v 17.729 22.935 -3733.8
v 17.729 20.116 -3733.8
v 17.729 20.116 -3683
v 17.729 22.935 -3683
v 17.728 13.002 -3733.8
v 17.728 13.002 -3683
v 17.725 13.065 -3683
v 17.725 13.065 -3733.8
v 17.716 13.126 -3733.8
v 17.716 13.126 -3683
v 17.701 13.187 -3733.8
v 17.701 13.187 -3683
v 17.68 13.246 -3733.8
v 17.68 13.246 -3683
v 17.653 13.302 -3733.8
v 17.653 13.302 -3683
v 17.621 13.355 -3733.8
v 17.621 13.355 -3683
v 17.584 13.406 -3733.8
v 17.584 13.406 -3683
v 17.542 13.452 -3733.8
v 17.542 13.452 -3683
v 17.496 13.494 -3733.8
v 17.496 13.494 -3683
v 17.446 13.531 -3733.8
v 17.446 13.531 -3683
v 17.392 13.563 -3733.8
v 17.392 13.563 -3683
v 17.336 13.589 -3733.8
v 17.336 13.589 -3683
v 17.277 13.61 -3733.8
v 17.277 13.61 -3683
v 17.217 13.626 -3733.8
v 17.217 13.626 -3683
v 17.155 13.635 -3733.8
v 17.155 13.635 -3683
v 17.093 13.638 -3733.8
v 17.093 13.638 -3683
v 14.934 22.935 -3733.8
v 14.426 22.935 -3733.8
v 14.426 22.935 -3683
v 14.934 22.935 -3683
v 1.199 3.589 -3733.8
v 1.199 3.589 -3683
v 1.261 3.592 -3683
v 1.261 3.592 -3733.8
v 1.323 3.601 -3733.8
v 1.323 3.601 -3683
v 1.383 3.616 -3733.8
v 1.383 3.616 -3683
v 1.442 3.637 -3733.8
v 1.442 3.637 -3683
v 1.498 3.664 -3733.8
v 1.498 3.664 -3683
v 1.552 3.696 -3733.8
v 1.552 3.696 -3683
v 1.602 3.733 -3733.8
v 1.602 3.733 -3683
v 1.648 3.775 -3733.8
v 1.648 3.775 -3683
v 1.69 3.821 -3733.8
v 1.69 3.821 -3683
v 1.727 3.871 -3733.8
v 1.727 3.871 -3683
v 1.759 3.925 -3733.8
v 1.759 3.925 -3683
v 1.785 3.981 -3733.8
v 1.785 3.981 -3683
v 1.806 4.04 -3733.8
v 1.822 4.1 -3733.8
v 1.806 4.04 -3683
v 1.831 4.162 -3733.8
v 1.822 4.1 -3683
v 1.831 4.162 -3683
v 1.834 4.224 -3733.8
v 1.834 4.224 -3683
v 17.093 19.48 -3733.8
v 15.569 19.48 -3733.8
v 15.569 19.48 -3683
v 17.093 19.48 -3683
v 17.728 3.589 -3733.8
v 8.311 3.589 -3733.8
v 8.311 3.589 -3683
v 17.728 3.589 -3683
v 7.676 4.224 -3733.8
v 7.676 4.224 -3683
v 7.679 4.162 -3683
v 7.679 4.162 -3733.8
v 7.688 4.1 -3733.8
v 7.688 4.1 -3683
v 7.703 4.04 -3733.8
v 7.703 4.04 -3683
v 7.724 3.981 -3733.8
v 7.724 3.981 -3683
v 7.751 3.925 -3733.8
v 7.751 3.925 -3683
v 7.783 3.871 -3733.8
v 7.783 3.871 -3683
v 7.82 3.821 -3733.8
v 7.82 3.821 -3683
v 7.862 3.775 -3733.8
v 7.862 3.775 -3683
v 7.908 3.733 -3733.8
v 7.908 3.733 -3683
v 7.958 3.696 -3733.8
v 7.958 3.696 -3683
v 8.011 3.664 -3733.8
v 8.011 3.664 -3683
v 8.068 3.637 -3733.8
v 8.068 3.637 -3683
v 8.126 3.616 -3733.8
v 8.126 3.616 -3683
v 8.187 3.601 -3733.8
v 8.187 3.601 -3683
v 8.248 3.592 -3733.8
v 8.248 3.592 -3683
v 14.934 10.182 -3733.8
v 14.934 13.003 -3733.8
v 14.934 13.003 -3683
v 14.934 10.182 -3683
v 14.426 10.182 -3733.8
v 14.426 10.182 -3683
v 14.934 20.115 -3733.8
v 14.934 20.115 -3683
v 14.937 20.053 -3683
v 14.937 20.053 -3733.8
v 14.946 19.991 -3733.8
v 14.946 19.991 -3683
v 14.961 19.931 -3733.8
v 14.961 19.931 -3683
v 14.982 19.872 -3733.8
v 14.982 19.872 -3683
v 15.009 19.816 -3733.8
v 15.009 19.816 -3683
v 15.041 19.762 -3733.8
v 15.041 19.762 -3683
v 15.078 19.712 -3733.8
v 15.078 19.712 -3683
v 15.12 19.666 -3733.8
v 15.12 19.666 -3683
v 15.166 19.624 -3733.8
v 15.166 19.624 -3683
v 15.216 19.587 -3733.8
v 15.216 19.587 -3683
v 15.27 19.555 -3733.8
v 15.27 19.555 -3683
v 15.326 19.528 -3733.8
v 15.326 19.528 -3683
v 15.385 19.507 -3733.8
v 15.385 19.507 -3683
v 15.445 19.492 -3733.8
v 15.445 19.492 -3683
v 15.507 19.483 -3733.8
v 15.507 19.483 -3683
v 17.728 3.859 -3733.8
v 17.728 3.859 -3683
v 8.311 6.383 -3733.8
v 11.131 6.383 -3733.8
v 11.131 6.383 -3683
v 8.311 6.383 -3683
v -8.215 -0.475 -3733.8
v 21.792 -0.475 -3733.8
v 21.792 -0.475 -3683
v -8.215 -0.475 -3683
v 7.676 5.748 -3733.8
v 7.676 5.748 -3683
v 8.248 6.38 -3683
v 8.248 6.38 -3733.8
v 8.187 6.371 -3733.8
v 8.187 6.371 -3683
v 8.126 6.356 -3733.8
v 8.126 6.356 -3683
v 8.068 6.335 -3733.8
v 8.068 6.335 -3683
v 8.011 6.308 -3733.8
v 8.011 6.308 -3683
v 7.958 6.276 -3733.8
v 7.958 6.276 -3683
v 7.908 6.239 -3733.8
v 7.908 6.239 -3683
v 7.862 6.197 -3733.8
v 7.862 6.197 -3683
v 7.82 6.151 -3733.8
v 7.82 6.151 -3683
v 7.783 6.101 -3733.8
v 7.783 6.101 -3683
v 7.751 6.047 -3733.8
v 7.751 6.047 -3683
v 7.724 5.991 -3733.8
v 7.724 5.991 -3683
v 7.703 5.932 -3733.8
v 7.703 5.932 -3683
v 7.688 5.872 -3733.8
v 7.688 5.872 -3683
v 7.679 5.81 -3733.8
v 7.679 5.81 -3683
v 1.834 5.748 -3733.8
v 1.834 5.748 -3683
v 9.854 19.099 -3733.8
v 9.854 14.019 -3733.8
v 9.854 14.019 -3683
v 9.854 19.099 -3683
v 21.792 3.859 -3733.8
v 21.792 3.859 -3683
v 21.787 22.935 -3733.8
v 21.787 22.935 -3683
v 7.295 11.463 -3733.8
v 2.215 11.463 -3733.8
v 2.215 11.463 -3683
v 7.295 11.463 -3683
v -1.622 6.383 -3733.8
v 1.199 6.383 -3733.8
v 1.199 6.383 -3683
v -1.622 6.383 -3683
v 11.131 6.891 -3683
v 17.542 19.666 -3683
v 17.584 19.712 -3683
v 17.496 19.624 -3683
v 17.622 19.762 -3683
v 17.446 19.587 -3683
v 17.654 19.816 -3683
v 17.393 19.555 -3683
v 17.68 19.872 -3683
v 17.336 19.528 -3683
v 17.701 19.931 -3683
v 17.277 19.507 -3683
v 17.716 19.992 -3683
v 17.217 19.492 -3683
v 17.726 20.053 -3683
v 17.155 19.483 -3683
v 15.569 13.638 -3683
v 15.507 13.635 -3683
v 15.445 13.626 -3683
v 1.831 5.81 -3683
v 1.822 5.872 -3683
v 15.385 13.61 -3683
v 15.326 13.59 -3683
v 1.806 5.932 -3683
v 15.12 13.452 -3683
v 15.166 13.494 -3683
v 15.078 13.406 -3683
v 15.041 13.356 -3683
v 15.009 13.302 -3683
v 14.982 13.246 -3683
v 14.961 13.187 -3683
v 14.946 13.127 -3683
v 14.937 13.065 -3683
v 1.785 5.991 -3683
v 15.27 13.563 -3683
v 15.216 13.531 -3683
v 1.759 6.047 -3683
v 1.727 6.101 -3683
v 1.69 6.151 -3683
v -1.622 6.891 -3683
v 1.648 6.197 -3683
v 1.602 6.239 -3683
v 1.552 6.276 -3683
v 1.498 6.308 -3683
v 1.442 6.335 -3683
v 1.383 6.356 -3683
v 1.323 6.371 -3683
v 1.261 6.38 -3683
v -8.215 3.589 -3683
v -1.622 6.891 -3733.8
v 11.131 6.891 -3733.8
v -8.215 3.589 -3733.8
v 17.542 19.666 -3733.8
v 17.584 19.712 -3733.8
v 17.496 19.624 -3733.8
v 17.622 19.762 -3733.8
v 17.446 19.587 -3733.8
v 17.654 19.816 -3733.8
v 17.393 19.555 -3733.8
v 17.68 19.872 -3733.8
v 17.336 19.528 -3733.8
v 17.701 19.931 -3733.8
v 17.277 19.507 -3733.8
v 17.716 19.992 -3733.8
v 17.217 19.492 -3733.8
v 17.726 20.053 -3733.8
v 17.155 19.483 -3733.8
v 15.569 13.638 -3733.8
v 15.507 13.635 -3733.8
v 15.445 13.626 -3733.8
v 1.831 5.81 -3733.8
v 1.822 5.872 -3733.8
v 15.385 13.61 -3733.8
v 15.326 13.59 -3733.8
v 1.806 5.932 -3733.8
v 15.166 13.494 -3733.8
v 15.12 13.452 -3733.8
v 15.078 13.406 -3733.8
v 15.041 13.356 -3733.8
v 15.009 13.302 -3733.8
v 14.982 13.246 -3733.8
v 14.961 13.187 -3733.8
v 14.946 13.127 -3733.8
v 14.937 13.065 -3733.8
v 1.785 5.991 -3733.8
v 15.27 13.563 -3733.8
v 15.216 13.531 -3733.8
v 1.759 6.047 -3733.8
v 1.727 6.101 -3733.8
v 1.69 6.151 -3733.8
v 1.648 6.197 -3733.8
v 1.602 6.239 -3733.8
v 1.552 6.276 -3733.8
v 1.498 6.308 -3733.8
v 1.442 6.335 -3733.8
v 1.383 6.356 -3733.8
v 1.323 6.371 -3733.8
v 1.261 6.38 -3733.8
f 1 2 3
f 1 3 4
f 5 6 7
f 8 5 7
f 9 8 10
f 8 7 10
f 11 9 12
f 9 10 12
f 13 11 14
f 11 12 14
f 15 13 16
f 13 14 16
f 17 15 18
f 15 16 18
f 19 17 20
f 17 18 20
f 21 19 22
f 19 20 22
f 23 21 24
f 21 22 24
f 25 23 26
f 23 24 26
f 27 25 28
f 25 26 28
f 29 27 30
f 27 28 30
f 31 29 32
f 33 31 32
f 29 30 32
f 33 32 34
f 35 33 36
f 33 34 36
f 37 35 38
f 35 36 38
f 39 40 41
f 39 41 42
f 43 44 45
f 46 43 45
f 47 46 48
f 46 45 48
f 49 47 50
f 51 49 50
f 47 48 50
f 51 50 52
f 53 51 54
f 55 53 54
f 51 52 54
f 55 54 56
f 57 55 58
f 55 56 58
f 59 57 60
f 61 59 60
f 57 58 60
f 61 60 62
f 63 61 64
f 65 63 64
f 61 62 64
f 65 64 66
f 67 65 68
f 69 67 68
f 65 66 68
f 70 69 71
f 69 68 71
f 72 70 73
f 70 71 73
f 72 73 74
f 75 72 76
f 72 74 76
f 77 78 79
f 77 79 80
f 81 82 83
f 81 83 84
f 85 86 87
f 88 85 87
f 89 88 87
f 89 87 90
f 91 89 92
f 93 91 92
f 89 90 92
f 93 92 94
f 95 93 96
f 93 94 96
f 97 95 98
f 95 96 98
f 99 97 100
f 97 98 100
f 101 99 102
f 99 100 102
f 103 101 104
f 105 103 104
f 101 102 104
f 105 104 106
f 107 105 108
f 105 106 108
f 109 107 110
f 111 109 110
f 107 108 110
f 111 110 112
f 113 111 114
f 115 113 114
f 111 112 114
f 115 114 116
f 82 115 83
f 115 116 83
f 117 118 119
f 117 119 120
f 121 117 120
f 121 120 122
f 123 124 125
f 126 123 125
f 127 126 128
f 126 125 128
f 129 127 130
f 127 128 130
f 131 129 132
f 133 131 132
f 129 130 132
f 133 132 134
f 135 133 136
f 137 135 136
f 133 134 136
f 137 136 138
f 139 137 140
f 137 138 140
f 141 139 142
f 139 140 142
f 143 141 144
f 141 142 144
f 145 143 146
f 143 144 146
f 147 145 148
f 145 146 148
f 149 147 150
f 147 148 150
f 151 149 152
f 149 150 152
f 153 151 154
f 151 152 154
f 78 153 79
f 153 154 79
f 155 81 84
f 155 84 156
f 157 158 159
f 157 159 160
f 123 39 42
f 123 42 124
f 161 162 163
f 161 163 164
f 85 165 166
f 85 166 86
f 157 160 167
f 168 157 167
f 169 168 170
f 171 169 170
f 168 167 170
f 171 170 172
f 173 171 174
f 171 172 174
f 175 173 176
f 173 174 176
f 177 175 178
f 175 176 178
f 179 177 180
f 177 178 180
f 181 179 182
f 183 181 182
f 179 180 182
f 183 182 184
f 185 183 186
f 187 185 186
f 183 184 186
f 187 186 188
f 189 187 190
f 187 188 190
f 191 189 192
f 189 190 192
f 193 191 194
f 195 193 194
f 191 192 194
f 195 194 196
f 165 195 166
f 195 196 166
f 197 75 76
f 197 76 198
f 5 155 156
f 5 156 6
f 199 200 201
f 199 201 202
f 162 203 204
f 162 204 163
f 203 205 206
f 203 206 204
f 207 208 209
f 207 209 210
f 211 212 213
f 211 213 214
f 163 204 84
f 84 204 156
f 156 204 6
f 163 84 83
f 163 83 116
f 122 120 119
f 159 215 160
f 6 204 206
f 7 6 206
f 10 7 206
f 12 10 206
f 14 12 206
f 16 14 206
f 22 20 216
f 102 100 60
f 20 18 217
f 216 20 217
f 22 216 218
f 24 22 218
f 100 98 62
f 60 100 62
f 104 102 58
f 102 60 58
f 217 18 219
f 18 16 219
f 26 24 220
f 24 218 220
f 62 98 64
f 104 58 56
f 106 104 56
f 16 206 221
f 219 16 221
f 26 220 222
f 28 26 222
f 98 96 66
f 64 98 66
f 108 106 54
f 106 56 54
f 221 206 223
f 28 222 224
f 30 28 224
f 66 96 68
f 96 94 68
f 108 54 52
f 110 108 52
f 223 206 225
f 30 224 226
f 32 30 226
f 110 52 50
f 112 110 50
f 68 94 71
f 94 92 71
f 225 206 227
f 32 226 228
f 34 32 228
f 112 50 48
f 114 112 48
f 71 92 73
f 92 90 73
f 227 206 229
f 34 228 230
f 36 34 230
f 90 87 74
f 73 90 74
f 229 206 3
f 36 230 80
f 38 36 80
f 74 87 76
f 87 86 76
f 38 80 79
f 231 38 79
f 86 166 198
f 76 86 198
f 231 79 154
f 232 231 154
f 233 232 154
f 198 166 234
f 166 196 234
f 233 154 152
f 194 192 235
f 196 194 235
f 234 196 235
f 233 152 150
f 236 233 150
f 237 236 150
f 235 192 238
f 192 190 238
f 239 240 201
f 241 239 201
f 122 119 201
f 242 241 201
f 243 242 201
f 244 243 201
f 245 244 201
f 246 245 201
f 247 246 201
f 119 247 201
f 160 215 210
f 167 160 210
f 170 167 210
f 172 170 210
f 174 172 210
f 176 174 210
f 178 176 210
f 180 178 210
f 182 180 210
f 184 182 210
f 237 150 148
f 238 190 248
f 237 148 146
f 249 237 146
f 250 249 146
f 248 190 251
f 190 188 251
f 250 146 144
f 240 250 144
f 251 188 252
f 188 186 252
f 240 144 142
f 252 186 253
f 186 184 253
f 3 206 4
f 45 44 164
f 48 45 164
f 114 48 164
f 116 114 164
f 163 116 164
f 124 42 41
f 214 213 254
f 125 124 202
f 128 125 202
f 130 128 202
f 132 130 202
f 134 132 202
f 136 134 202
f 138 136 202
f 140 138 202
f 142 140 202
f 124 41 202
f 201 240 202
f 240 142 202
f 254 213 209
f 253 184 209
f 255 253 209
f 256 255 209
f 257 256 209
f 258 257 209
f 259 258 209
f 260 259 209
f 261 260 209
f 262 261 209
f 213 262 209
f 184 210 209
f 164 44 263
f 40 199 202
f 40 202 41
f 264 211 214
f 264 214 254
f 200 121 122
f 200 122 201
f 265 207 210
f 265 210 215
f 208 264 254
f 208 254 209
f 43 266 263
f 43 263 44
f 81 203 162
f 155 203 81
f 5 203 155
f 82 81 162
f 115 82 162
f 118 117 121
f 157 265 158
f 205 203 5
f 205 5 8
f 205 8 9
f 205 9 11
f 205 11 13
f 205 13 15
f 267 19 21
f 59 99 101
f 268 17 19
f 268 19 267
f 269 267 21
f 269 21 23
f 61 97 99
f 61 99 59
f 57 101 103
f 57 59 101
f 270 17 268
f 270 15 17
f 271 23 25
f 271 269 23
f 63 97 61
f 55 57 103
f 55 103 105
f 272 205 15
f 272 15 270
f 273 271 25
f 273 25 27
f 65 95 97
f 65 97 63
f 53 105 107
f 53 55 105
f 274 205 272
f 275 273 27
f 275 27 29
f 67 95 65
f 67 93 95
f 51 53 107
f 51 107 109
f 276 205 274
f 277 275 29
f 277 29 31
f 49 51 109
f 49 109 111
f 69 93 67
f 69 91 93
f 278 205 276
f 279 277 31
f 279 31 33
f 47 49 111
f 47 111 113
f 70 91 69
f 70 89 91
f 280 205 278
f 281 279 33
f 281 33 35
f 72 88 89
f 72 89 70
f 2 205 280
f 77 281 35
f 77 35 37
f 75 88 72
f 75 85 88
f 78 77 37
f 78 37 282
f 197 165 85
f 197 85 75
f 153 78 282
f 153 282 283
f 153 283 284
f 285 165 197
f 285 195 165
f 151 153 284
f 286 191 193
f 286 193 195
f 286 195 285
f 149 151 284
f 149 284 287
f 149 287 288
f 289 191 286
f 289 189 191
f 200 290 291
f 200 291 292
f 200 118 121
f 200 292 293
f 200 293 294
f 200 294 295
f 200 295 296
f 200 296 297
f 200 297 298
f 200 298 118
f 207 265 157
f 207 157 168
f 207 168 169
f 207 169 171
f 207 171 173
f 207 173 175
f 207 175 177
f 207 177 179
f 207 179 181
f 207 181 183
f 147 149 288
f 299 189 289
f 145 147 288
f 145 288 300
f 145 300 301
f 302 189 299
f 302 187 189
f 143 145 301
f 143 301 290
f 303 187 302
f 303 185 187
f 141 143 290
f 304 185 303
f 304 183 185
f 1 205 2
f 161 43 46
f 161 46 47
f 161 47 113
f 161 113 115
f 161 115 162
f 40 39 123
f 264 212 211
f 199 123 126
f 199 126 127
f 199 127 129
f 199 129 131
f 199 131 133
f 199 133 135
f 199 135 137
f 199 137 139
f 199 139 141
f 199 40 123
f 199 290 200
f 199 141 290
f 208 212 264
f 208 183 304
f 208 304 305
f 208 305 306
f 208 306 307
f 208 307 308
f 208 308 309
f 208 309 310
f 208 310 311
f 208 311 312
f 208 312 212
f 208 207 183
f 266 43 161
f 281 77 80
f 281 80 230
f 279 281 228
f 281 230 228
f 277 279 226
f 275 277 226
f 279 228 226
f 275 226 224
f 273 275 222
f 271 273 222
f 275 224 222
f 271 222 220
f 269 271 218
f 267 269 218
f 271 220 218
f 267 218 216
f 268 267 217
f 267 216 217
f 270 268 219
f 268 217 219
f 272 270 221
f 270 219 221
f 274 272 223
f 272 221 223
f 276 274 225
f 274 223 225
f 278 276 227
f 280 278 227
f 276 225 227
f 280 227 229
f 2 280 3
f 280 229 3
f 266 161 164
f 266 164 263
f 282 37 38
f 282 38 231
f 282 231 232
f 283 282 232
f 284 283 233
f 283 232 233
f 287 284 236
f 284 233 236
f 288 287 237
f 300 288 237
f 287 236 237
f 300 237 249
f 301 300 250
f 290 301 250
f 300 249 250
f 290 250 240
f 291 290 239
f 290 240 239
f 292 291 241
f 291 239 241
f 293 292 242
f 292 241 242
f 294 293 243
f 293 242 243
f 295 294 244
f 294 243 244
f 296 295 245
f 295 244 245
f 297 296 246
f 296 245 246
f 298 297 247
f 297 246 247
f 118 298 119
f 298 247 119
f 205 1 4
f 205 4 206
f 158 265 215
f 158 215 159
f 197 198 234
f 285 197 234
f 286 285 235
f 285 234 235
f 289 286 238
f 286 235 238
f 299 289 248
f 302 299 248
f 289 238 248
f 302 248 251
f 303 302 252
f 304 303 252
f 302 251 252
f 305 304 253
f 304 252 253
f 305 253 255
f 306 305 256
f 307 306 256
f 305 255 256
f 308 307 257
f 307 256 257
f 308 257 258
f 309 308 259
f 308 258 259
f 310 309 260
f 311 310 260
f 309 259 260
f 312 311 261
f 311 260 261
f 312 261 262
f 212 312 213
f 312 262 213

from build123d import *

# Parameters (mm, degrees)
BOSS_EXTRUDE1_DEPTH = 50.8


with BuildPart() as part:
    # Sketch1 → Boss-Extrude1 (new body)
    with BuildSketch(Plane(origin=(0, 0, -3683), x_dir=(-1, 0, 0), z_dir=(0, 0, -1))):
        with BuildLine():
            Line((7.945265893, 3.588862728), (-1.198734107, 3.588862728))
            ThreePointArc((-1.198734107, 3.588862728), (-1.647746913, 3.774849922), (-1.833734107, 4.223862728))
            Line((-1.833734107, 4.223862728), (-1.833734107, 5.747862728))
            ThreePointArc((-1.833734107, 5.747862728), (-1.647746913, 6.196875535), (-1.198734107, 6.382862728))
            Line((-1.198734107, 6.382862728), (1.621629442, 6.382862728))
            Line((1.621629442, 6.382862728), (1.621629442, 6.890862686))
            Line((1.621629442, 6.890862686), (-2.214734107, 11.462862728))
            Line((-2.214734107, 11.462862728), (-7.294734107, 11.462862728))
            Line((-7.294734107, 11.462862728), (-11.131097656, 6.890862686))
            Line((-11.131097656, 6.890862686), (-11.131097656, 6.382862728))
            Line((-11.131097656, 6.382862728), (-8.310734107, 6.382862728))
            ThreePointArc((-8.310734107, 6.382862728), (-7.861721301, 6.196875535), (-7.675734107, 5.747862728))
            Line((-7.675734107, 5.747862728), (-7.675734107, 4.223862728))
            ThreePointArc((-7.675734107, 4.223862728), (-7.861721301, 3.774849922), (-8.310734107, 3.588862728))
            Line((-8.310734107, 3.588862728), (-17.454734107, 3.588862728))
            Line((-17.454734107, 3.588862728), (-17.727921752, 3.588862728))
            Line((-17.727921752, 3.588862728), (-17.727921752, 3.858842754))
            Line((-17.727921752, 3.858842754), (-17.728361466, 13.002372481))
            ThreePointArc((-17.728361466, 13.002372481), (-17.542256287, 13.451715967), (-17.092921752, 13.637842754))
            Line((-17.092921752, 13.637842754), (-15.568921752, 13.637842754))
            ThreePointArc((-15.568921752, 13.637842754), (-15.119908946, 13.45185556), (-14.933921752, 13.002842754))
            Line((-14.933921752, 13.002842754), (-14.933921752, 10.182479205))
            Line((-14.933921752, 10.182479205), (-14.425921794, 10.182479205))
            Line((-14.425921794, 10.182479205), (-9.853921752, 14.018842754))
            Line((-9.853921752, 14.018842754), (-9.853921752, 19.098842754))
            Line((-9.853921752, 19.098842754), (-14.425921794, 22.935206303))
            Line((-14.425921794, 22.935206303), (-14.933921752, 22.935206303))
            Line((-14.933921752, 22.935206303), (-14.933921752, 20.114842754))
            ThreePointArc((-14.933921752, 20.114842754), (-15.119908946, 19.665829948), (-15.568921752, 19.479842754))
            Line((-15.568921752, 19.479842754), (-17.092921752, 19.479842754))
            ThreePointArc((-17.092921752, 19.479842754), (-17.542476558, 19.66604812), (-17.728703542, 20.11559397))
            Line((-17.728703542, 20.11559397), (-17.728839138, 22.935206303))
            Line((-17.728839138, 22.935206303), (-21.787214199, 22.935206303))
            Line((-21.787214199, 22.935206303), (-21.791921752, 3.859128788))
            Line((-21.791921752, 3.859128788), (-21.791921752, 3.588862728))
            Line((-21.791921752, 3.588862728), (-21.791921752, -0.475137272))
            Line((-21.791921752, -0.475137272), (-17.727921752, -0.475137272))
            Line((-17.727921752, -0.475137272), (-17.454774021, -0.475137272))
            Line((-17.454774021, -0.475137272), (7.945225979, -0.475137272))
            Line((7.945225979, -0.475137272), (8.215492039, -0.475137272))
            Line((8.215492039, -0.475137272), (8.215492039, 3.588862728))
            Line((8.215492039, 3.588862728), (7.945265893, 3.588862728))
        make_face()
    extrude(amount=BOSS_EXTRUDE1_DEPTH)


solid = part.part
